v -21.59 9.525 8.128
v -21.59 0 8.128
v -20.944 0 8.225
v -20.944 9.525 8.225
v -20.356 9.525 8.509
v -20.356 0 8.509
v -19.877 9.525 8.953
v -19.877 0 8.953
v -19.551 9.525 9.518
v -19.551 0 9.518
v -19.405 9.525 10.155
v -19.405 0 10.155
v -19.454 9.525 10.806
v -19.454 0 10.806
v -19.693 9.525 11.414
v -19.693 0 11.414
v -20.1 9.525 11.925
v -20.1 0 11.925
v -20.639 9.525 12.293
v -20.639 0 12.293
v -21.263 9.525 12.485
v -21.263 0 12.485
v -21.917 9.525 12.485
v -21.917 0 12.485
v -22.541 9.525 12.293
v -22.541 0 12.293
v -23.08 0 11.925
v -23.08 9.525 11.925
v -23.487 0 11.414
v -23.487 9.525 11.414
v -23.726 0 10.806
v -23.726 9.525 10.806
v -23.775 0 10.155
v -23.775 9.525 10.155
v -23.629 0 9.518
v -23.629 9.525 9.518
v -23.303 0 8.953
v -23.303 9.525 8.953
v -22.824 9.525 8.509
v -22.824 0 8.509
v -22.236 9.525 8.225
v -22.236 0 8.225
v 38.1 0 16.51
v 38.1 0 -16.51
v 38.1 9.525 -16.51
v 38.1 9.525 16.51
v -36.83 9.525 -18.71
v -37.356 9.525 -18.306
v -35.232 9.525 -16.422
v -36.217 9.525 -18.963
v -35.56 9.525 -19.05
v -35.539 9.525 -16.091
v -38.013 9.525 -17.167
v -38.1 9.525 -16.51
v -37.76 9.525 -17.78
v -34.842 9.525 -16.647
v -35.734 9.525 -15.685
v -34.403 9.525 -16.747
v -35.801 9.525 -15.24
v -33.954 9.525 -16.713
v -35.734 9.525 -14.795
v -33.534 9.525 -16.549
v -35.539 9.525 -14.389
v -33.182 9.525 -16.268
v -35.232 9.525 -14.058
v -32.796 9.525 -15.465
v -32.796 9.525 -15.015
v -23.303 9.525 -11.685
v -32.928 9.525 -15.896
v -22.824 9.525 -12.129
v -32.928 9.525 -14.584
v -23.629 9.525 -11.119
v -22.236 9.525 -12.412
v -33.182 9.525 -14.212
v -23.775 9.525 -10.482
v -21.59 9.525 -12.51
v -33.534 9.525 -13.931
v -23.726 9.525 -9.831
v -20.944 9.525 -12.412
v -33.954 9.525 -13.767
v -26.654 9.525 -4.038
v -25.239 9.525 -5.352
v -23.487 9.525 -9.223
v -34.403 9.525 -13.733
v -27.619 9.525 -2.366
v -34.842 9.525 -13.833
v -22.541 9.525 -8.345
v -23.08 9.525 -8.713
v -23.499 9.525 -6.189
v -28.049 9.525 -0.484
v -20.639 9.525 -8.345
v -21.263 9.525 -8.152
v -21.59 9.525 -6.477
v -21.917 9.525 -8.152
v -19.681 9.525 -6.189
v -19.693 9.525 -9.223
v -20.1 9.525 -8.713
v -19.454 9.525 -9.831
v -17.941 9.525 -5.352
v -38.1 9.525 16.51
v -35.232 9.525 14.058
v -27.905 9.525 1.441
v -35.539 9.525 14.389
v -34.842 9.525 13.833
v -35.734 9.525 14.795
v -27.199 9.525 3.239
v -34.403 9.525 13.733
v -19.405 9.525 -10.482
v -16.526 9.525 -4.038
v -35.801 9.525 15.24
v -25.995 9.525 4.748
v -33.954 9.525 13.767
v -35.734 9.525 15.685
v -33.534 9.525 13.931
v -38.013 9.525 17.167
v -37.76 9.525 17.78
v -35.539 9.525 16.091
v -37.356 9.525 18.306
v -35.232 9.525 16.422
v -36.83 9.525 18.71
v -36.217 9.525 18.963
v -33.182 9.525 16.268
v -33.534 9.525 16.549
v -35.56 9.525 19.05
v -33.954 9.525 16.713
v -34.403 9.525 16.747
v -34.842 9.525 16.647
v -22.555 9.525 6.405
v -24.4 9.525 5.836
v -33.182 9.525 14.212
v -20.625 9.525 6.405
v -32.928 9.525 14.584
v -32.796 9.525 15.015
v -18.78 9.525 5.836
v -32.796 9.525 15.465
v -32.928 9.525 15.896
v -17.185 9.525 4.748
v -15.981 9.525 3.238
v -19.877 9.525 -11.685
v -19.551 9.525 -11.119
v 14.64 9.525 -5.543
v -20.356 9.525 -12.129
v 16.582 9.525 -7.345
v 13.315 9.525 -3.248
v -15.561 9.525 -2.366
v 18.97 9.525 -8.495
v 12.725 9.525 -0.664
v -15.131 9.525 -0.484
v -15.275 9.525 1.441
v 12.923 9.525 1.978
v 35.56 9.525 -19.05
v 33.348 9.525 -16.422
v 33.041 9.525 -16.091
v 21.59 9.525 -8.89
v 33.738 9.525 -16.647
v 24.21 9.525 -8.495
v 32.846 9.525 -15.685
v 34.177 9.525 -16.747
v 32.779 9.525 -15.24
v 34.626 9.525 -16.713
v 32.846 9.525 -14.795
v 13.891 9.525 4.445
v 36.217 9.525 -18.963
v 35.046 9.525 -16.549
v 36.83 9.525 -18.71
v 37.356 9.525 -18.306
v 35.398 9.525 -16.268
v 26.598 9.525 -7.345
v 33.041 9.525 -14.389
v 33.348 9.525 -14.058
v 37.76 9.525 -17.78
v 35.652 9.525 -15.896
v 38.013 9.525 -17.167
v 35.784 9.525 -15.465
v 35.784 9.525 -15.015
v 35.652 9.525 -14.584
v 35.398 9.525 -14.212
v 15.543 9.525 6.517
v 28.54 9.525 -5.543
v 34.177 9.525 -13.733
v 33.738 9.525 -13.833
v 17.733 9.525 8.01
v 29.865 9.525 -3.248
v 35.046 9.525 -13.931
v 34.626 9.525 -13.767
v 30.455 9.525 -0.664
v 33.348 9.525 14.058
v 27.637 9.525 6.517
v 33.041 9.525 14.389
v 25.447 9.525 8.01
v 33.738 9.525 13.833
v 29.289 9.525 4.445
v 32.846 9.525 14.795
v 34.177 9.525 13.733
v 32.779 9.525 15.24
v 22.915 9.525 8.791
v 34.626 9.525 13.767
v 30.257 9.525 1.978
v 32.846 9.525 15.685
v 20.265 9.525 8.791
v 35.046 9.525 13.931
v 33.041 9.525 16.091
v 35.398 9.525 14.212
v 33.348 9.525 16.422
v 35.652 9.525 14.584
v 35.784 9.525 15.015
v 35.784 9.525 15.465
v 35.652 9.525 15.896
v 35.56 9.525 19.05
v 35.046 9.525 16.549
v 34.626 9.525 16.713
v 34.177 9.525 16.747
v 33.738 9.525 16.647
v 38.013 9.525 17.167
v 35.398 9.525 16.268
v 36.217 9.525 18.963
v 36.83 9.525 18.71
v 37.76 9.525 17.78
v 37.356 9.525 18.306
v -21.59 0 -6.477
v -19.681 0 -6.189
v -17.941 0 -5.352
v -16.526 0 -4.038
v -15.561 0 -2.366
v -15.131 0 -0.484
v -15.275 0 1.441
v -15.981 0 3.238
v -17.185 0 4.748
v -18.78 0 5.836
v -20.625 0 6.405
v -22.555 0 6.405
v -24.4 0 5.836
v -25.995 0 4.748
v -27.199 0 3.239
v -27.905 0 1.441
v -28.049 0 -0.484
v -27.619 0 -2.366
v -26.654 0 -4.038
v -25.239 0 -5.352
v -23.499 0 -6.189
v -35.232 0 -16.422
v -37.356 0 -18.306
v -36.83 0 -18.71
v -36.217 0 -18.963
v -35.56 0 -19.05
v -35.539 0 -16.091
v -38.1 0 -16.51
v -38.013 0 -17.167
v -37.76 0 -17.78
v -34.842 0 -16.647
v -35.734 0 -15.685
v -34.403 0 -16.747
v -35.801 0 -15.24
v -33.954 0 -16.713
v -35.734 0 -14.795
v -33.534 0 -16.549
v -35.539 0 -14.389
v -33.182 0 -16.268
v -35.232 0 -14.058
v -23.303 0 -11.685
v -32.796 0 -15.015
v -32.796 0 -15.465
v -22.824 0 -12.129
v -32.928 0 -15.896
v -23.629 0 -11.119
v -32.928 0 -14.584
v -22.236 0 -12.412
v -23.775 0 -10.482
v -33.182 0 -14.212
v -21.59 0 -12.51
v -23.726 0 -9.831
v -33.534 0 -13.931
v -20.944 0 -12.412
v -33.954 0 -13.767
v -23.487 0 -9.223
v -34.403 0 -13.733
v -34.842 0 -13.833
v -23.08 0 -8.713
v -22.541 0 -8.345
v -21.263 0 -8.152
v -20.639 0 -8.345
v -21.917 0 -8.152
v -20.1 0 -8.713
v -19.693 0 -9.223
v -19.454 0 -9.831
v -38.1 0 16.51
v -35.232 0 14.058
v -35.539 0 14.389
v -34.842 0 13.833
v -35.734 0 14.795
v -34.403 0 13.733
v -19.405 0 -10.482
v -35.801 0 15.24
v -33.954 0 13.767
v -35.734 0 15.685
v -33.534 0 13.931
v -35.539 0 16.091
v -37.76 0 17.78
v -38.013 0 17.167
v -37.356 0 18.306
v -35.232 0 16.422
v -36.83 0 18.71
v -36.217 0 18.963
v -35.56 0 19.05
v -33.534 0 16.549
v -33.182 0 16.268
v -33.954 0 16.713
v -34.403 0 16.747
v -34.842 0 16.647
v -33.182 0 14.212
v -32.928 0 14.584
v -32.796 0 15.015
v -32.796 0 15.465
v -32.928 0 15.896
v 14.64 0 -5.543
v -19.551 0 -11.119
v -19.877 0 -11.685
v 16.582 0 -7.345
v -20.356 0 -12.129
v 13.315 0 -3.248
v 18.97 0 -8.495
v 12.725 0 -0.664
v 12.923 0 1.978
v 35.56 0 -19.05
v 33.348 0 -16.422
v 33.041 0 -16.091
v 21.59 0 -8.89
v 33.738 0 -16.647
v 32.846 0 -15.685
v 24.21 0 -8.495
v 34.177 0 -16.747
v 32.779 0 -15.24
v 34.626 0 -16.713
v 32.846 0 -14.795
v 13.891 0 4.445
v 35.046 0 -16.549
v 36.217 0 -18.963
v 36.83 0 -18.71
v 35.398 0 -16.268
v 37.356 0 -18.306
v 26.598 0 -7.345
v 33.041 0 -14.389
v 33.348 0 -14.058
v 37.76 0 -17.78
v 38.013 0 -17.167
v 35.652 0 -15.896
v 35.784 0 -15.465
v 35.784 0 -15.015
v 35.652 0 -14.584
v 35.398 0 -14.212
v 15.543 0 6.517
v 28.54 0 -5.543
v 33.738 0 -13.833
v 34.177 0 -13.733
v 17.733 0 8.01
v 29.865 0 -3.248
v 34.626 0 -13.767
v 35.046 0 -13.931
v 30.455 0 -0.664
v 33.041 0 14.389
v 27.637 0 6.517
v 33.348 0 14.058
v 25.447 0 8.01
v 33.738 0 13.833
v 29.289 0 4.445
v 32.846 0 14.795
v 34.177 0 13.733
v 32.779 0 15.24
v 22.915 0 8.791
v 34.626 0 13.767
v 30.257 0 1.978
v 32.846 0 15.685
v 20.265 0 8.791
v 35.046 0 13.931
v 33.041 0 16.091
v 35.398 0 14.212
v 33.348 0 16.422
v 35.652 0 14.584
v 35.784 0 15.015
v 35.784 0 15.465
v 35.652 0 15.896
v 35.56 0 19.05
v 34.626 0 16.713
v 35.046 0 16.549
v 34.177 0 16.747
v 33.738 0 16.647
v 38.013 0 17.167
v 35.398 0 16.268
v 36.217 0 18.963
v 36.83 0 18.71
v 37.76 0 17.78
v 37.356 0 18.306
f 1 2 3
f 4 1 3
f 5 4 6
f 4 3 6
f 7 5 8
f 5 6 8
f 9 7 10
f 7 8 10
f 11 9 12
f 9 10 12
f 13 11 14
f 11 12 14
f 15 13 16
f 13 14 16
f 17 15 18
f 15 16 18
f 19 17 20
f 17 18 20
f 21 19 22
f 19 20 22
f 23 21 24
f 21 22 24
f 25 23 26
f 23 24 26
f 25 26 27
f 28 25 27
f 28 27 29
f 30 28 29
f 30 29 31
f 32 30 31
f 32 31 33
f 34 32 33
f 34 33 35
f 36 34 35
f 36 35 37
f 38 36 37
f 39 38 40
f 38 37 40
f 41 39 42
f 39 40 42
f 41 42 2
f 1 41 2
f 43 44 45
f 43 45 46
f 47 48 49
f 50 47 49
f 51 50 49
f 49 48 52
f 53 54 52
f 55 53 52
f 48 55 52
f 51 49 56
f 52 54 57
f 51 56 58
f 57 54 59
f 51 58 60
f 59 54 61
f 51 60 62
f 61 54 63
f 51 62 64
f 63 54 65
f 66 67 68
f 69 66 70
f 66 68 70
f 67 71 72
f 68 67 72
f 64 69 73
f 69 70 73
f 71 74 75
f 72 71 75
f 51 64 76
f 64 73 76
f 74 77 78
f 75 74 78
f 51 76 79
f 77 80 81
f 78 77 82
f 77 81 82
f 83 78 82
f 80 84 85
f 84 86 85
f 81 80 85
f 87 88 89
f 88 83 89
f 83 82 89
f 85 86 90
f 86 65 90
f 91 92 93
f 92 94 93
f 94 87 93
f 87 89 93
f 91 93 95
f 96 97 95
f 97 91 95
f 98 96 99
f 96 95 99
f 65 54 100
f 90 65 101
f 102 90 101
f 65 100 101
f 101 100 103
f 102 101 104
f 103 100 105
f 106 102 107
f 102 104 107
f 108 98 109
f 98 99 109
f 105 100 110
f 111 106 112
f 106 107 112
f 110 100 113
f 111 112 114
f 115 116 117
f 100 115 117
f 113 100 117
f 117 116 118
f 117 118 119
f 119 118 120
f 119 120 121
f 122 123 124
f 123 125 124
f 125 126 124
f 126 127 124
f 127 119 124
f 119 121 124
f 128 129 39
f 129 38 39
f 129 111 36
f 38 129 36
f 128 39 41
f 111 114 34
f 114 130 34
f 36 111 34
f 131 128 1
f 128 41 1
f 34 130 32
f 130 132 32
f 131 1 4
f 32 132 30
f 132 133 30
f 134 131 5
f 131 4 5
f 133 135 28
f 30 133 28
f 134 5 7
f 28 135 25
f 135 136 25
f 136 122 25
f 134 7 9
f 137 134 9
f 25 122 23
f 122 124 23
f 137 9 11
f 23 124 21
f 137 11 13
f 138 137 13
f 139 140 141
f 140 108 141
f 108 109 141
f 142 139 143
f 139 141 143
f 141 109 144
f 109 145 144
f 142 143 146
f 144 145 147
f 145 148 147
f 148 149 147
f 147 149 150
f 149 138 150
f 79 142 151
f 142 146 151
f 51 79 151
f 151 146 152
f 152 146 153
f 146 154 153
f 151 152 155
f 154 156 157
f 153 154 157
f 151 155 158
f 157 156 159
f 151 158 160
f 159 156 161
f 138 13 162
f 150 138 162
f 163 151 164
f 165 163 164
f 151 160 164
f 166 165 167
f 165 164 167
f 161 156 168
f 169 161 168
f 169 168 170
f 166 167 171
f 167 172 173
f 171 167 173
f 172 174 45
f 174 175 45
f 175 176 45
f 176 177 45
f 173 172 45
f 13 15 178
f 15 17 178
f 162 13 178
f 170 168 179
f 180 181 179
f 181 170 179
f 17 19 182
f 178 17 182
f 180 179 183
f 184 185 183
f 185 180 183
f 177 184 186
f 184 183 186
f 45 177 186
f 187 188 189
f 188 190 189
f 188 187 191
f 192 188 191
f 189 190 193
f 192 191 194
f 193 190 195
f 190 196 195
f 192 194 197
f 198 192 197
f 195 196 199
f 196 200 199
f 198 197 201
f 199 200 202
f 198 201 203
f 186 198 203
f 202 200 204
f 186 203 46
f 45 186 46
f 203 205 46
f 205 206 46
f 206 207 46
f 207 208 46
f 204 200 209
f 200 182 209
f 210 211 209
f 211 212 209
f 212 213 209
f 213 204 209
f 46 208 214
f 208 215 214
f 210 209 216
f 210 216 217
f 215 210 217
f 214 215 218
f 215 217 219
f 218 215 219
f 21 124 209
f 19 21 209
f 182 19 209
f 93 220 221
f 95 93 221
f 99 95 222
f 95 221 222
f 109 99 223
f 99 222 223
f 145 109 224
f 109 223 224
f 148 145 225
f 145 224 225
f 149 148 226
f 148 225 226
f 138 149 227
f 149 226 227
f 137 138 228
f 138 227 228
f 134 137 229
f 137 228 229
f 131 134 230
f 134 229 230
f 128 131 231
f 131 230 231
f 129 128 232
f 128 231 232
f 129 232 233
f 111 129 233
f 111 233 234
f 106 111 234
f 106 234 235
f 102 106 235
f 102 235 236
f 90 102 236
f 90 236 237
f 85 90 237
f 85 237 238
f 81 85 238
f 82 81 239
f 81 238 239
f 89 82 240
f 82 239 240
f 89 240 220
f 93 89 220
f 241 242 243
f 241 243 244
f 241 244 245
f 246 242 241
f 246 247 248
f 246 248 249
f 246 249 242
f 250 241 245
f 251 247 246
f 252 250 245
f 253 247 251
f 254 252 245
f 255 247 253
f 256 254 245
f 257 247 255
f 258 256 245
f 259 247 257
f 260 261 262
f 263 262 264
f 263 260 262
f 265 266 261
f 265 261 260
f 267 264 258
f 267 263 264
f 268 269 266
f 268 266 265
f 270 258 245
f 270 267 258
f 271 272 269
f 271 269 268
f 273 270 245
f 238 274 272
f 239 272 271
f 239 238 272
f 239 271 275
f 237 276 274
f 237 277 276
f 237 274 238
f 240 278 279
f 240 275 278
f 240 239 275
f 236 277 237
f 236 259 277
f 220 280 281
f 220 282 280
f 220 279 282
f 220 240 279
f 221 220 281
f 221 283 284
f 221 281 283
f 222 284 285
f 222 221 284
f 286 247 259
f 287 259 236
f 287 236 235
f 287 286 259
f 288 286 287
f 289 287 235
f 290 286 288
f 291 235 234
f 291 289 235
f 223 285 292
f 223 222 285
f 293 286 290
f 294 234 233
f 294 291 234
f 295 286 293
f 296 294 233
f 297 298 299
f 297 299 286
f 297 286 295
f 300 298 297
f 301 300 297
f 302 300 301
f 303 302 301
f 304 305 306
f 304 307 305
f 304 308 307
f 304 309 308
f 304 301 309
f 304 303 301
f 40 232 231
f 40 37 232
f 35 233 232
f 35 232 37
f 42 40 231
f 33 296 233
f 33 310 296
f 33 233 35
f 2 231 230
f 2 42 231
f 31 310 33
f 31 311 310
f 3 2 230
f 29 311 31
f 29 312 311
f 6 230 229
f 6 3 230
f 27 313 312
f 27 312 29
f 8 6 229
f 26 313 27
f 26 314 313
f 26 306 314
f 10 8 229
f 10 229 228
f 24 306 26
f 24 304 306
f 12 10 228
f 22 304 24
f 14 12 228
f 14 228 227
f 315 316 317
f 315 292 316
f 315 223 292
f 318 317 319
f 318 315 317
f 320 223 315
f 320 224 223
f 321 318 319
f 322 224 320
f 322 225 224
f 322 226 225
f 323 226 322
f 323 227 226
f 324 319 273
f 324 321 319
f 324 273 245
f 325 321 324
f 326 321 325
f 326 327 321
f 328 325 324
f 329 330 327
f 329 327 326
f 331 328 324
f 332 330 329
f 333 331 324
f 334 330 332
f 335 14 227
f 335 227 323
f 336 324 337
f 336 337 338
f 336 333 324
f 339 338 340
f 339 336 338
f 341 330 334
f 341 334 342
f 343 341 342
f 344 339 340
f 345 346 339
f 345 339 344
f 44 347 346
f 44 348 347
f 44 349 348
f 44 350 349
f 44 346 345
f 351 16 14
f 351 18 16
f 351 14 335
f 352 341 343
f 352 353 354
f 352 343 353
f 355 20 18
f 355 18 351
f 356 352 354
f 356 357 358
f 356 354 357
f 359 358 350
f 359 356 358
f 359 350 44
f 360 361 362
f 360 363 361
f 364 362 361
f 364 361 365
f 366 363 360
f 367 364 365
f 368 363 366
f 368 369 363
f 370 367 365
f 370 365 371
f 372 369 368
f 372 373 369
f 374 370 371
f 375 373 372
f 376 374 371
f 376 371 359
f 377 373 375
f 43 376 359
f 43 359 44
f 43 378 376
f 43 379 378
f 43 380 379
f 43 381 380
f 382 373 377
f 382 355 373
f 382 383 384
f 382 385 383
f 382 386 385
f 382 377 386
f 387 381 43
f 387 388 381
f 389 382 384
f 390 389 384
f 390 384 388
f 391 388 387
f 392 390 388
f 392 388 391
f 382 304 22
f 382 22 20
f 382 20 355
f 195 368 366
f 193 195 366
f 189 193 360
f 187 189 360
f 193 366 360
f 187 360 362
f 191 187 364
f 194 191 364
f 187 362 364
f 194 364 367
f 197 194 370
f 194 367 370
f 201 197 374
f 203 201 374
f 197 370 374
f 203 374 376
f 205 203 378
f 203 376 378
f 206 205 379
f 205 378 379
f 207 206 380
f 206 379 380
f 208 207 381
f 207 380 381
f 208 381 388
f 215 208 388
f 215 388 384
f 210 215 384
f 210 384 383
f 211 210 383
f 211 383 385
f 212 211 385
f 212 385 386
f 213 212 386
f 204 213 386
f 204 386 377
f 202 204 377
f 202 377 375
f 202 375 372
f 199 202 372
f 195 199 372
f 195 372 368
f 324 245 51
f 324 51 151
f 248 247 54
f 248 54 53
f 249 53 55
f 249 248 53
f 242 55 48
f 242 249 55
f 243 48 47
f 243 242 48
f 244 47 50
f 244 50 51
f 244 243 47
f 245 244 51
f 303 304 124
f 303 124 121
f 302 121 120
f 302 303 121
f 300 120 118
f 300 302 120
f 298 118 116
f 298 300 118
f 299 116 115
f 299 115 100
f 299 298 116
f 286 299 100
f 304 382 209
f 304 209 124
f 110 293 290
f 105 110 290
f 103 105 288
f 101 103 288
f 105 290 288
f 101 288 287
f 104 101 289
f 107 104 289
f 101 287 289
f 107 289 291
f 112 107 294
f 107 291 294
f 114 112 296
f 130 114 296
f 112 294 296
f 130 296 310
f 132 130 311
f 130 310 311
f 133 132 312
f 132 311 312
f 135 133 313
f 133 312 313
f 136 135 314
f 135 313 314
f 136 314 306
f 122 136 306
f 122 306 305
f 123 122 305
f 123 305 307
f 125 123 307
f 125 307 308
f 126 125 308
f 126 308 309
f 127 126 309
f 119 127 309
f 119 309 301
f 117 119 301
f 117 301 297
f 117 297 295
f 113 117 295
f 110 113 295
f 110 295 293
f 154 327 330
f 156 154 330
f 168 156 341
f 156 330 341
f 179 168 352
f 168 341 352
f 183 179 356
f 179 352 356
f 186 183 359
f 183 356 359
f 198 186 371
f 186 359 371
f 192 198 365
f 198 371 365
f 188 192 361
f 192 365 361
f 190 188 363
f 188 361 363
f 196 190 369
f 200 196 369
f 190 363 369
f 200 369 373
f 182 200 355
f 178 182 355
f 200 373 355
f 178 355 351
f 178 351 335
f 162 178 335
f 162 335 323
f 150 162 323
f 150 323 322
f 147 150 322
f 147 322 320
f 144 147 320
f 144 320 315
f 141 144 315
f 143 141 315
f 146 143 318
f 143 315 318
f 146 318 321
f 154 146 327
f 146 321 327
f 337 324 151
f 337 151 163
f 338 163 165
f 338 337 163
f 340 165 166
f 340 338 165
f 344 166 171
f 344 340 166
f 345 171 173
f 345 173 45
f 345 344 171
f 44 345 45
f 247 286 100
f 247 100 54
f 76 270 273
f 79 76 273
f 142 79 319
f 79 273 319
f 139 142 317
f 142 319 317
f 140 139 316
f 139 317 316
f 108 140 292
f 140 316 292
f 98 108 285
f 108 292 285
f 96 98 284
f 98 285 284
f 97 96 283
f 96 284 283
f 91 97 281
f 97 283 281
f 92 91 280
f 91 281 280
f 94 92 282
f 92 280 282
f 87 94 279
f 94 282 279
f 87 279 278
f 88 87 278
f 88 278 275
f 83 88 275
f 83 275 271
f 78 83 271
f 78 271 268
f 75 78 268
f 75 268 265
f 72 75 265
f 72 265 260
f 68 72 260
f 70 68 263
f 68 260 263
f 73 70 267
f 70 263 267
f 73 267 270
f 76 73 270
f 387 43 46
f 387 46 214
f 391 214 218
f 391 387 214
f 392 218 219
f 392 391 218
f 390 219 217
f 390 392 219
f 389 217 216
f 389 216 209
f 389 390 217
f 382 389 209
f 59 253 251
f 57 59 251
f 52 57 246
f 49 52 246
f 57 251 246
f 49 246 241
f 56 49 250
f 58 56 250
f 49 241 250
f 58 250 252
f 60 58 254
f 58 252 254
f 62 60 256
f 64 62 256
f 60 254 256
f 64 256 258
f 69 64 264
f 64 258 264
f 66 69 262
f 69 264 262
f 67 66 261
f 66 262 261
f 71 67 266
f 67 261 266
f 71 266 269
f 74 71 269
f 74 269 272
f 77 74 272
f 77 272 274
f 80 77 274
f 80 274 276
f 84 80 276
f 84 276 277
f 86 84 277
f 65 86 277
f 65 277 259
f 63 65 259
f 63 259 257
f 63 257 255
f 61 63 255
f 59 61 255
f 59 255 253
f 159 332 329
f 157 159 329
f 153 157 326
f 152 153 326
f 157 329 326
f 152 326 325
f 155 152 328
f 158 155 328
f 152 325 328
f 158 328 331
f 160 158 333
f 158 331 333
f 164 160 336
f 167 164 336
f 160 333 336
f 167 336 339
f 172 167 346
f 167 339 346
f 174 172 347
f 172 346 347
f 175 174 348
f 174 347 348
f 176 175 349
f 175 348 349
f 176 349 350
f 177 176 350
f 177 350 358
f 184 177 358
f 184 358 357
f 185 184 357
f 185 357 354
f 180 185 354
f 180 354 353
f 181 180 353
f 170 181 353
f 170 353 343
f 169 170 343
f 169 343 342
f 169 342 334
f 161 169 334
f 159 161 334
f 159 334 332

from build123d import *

# Parameters (mm, degrees)
SKETCH1_R                 = 6.477
SKETCH1_R_2               = 2.19075
SKETCH1_R_3               = 8.89
BOSS_EXTRUDE1_DEPTH       = 9.525
F_1_0MM_DOWEL_HOLE1_D     = 3.0226
F_1_0MM_DOWEL_HOLE1_DEPTH = 9.99998
F_1_0MM_DOWEL_HOLE1_TIP   = 0.908080654


with BuildPart() as part:
    # Sketch1 → Boss-Extrude1 (new body)
    with BuildSketch(Plane.XZ):
        with BuildLine():
            Line((-35.56, -19.05), (35.56, -19.05))
            ThreePointArc((35.56, -19.05), (37.356051224, -18.306051224), (38.1, -16.51))
            Line((38.1, -16.51), (38.1, 16.51))
            ThreePointArc((38.1, 16.51), (37.356051224, 18.306051224), (35.56, 19.05))
            Line((35.56, 19.05), (-35.56, 19.05))
            ThreePointArc((-35.56, 19.05), (-37.356051224, 18.306051224), (-38.1, 16.51))
            Line((-38.1, 16.51), (-38.1, -16.51))
            ThreePointArc((-38.1, -16.51), (-37.356051224, -18.306051224), (-35.56, -19.05))
        make_face()
        with Locations(Location((-21.59, 0, 0), (0, 0, 270))):
            Circle(SKETCH1_R, mode=Mode.SUBTRACT)
        with Locations(Location((-21.59, -10.31875, 0), (0, 0, 270))):
            Circle(SKETCH1_R_2, mode=Mode.SUBTRACT)
        with Locations(Location((-21.59, 10.31875, 0), (0, 0, 270))):
            Circle(SKETCH1_R_2, mode=Mode.SUBTRACT)
        with Locations(Location((21.59, 0, 0), (0, 0, 270))):
            Circle(SKETCH1_R_3, mode=Mode.SUBTRACT)
    extrude(amount=-BOSS_EXTRUDE1_DEPTH)

    # Ø1.0mm Dowel Hole1
    with Locations(Plane(origin=(0, 9.525, 0), x_dir=(1, 0, 0), z_dir=(0, 1, 0))):
        with Locations((-34.29, 15.24), (-34.29, -15.24), (34.29, -15.24), (34.29, 15.24)):
            Hole(F_1_0MM_DOWEL_HOLE1_D / 2, depth=F_1_0MM_DOWEL_HOLE1_DEPTH)
            with Locations((0, 0, -(F_1_0MM_DOWEL_HOLE1_DEPTH + F_1_0MM_DOWEL_HOLE1_TIP / 2))):  # 118° drill point
                Cone(0, F_1_0MM_DOWEL_HOLE1_D / 2, F_1_0MM_DOWEL_HOLE1_TIP, mode=Mode.SUBTRACT)


solid = part.part
